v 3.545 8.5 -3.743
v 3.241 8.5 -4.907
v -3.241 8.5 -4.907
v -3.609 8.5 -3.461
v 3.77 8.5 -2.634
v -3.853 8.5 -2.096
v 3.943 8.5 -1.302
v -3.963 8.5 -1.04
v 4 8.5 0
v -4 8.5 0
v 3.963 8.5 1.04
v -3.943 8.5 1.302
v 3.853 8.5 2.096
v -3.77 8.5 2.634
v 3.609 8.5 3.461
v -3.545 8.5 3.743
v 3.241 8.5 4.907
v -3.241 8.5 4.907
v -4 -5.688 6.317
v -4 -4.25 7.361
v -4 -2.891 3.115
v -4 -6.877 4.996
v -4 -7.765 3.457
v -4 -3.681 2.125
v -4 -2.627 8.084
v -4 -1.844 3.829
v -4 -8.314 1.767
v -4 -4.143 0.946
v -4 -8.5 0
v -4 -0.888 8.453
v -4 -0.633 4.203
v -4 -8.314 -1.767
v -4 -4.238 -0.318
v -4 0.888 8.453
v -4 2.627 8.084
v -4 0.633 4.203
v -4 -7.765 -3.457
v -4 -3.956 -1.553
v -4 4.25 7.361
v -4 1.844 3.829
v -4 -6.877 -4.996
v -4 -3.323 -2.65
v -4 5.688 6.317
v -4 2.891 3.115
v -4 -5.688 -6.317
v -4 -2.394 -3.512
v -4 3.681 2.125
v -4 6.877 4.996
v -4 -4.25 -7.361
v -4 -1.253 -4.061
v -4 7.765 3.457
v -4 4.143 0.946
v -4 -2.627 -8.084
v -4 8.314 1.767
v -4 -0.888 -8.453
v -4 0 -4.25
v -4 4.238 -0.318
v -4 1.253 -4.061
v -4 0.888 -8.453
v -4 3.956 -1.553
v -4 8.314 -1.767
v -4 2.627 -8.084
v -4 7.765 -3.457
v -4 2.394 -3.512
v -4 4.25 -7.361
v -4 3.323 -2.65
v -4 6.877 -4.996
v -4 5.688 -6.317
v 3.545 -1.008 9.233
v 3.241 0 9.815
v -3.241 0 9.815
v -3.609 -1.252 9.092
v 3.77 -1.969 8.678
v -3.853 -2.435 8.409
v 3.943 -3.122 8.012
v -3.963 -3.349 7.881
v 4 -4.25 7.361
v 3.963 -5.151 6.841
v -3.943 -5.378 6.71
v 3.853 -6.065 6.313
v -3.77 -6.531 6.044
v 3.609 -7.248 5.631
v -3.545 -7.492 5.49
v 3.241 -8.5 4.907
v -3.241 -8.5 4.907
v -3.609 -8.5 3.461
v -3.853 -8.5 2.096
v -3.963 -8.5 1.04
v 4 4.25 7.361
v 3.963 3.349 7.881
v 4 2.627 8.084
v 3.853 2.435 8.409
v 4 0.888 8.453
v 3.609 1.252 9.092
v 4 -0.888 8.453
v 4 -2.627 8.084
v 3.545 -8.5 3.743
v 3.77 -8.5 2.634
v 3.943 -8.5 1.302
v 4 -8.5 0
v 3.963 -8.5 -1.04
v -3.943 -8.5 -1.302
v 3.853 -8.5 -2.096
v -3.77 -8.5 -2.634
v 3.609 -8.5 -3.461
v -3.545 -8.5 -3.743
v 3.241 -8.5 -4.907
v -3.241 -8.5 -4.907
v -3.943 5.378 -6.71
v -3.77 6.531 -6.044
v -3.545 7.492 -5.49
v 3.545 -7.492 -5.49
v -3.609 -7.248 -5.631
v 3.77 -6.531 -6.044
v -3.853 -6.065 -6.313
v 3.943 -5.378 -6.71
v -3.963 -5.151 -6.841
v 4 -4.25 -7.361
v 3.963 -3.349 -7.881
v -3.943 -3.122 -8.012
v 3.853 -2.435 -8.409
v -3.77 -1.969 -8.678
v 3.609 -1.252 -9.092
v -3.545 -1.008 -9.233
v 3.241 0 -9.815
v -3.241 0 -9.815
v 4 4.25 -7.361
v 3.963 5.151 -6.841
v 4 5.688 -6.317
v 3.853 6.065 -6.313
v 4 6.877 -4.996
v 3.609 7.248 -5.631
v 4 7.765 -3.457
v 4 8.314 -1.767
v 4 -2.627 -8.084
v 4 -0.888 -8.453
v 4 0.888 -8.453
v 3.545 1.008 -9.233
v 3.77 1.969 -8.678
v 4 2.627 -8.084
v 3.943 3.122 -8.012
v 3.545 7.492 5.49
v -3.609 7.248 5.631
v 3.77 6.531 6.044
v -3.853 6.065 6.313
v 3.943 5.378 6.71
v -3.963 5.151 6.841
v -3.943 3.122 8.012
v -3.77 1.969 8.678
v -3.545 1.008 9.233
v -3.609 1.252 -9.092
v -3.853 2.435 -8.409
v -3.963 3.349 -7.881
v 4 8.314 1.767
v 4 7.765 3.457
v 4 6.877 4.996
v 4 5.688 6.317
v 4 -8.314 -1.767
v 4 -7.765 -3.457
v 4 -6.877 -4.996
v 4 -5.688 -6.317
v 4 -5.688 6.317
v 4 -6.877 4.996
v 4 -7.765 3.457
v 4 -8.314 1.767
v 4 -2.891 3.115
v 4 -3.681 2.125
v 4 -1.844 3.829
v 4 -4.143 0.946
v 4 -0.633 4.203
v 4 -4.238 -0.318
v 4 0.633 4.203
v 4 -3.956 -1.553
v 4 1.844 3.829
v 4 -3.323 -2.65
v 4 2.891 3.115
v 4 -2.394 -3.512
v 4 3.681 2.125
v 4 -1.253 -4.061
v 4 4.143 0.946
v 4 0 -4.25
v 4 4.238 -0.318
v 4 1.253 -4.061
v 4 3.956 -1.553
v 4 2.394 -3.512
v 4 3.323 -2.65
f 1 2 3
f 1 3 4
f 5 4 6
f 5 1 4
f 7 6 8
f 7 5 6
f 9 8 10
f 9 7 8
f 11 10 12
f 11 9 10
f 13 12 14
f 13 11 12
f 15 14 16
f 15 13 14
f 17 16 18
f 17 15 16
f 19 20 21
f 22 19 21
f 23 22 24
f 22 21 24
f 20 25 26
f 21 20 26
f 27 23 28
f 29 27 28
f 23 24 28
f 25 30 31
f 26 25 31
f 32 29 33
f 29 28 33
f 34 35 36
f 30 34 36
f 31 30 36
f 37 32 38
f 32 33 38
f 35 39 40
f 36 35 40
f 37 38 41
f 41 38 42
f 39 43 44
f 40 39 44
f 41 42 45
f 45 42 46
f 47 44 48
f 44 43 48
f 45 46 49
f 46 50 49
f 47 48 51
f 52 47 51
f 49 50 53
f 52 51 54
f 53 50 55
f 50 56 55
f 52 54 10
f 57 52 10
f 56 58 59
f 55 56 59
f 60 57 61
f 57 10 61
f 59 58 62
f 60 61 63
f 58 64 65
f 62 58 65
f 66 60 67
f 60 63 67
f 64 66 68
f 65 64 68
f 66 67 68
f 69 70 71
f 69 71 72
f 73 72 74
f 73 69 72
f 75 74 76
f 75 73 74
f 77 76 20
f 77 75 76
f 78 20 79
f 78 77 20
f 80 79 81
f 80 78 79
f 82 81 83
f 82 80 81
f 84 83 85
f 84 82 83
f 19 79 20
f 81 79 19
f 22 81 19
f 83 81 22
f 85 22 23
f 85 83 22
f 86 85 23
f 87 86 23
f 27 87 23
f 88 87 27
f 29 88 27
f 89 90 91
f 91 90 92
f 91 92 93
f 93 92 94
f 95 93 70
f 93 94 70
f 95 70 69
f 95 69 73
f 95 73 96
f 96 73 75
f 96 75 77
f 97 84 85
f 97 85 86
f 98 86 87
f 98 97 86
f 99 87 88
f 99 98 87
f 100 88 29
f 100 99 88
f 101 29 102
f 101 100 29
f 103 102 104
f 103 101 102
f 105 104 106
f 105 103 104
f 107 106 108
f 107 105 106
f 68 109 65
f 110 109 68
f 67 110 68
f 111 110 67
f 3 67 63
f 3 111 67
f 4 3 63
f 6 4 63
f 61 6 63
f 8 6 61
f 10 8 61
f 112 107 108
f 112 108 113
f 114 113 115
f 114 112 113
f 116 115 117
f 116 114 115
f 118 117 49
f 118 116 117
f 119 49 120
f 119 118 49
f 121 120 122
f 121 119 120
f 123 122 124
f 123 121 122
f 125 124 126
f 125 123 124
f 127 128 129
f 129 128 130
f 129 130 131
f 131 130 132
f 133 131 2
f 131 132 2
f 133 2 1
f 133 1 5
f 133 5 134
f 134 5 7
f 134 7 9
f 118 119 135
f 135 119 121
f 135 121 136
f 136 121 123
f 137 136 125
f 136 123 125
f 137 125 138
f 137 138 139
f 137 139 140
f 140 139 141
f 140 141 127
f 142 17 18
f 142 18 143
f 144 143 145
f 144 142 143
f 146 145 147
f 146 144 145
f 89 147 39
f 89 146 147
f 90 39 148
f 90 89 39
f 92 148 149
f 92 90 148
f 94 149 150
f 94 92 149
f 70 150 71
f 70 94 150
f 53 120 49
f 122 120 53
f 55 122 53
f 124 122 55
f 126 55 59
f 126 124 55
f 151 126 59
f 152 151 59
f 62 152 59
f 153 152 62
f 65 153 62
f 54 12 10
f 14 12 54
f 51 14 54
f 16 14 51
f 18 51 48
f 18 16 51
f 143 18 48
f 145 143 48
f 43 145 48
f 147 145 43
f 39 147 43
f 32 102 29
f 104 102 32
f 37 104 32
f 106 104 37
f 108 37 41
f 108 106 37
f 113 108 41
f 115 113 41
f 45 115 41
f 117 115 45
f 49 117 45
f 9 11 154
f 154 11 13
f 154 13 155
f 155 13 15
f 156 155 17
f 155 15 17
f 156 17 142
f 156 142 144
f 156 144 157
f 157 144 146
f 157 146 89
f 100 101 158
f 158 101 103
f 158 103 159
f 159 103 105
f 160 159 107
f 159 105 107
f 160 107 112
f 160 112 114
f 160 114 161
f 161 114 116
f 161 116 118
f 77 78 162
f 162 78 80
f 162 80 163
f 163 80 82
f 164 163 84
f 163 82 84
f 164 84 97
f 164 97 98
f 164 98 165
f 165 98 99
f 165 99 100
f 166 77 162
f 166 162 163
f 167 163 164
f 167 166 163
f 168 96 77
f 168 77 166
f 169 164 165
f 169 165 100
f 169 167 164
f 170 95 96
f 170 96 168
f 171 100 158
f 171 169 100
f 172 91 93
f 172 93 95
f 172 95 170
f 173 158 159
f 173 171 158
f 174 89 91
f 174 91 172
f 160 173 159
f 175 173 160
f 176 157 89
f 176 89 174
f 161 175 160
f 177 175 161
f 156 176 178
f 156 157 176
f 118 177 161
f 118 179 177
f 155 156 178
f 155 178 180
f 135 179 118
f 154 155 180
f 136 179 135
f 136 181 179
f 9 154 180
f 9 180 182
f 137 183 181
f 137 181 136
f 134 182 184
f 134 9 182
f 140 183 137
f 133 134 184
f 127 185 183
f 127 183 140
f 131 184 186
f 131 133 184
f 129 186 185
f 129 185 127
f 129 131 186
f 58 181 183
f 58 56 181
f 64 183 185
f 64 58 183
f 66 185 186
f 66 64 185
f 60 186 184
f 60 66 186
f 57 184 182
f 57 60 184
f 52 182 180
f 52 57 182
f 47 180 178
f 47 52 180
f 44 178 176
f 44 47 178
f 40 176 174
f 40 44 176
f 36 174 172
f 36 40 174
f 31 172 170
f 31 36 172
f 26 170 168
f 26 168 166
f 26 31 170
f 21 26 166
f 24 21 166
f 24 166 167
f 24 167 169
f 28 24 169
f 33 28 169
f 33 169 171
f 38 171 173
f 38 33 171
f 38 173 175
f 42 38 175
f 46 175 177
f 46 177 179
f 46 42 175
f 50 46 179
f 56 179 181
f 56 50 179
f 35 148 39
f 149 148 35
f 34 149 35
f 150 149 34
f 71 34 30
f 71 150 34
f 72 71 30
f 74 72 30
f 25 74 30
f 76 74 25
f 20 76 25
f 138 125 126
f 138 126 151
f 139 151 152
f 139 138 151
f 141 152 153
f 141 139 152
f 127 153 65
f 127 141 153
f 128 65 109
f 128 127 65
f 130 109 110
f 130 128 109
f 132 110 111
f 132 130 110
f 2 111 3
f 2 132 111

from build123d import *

# Parameters (mm, degrees)
SKETCH1_R      = 4.25
EXTRUDE1_DEPTH = 4


# Read off the part's stored shape, not the designer's step: Cut-Extrude1
with BuildPart() as part:
    # Sketch1 → Extrude1 (new, symmetric)
    with BuildSketch(Plane(origin=(0, 0, 0), x_dir=(0, 0, -1), z_dir=(1, 0, 0))):
        Polygon((9.814954576, 0), (4.907477288, 8.5), (-4.907477288, 8.5), (-9.814954576, 0), (-4.907477288, -8.5), (4.907477288, -8.5), align=None)
        Circle(SKETCH1_R, mode=Mode.SUBTRACT)
    extrude(amount=EXTRUDE1_DEPTH, both=True)

    # Cut-Extrude1 outline → Cut-Extrude1 (revolve, cut)
    with BuildSketch(Plane.YX):
        Polygon((9.81495458, 4.000000073), (8.499999937, 4.000000073), (9.81495458, 3.240810619), align=None)
    cut_extrude1 = revolve(axis=Axis((0, 0, 0), (1, 0, 0)), mode=Mode.SUBTRACT)

    # Mirror1: Cut-Extrude1 across plane
    add(cut_extrude1.mirror(Plane(origin=(0, 0, 0), x_dir=(0, 0, 1), z_dir=(1, 0, 0))), mode=Mode.SUBTRACT)


solid = part.part
